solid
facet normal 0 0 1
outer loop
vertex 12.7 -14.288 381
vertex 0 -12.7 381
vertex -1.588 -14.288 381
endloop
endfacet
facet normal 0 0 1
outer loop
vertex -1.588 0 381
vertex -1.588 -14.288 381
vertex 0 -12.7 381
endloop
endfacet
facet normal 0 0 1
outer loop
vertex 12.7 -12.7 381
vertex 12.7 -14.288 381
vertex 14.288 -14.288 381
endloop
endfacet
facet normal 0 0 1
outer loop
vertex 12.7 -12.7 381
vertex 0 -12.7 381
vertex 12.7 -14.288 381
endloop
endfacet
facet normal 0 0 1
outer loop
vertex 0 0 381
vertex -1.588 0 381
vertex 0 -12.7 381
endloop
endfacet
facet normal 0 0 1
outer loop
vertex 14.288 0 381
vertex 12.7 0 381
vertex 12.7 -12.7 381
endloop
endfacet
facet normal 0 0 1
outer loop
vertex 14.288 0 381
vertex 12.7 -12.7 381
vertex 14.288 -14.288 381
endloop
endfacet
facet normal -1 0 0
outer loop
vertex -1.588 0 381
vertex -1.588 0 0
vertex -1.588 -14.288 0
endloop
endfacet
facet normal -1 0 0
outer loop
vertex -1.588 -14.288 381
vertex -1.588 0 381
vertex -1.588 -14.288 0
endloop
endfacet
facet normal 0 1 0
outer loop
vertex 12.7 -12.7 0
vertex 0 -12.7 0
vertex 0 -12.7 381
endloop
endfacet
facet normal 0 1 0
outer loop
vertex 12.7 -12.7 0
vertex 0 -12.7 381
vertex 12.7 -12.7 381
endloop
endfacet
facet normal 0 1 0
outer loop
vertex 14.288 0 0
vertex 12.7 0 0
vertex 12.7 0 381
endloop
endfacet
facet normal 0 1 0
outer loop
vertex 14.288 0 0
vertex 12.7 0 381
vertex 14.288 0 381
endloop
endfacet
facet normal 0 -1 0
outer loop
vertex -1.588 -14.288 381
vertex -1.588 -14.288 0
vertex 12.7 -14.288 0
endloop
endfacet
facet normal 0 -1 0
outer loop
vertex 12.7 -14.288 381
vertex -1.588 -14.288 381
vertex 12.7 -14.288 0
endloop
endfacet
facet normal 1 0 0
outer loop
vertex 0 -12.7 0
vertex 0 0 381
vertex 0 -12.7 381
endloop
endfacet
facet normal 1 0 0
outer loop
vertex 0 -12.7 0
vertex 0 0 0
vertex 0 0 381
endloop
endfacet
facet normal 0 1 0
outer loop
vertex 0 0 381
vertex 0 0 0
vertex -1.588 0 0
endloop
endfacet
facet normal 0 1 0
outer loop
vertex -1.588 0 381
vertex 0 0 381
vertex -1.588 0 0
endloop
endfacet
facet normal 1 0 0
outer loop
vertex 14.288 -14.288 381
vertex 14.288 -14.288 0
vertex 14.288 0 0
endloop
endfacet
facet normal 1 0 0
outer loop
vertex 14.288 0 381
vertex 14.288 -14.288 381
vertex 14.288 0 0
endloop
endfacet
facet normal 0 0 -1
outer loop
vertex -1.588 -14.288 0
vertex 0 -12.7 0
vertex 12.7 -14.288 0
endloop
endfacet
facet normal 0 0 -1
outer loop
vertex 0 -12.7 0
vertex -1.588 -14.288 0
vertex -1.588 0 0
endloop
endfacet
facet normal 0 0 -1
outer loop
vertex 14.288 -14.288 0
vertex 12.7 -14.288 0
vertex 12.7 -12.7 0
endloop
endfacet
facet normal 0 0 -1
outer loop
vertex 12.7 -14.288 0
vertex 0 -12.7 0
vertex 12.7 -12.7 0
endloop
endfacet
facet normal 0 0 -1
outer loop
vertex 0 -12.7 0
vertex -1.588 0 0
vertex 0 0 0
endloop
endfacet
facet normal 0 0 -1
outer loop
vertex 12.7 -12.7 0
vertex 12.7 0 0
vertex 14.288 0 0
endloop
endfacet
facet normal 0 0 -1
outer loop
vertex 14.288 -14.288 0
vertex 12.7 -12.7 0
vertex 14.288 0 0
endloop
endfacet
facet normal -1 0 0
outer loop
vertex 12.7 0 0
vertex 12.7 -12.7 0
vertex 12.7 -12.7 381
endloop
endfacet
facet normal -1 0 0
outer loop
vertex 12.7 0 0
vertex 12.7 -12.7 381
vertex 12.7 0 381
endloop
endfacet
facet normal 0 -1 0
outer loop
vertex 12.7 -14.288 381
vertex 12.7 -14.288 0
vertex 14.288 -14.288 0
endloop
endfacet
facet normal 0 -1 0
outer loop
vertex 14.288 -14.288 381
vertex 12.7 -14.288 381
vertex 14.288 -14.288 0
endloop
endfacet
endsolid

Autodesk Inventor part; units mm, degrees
ref_plane "YZ Plane" through (0, 0, 0) normal (1, 0, 0) x (0, 1, 0)
ref_plane "XZ Plane" through (0, 0, 0) normal (0, 1, 0) x (-1, 0, 0)
ref_plane "XY Plane" through (0, 0, 0) normal (0, 0, 1) x (1, 0, 0)
sketch "Sketch1" plane through (0, 0, 0) normal (0, 0, 1) x (1, 0, 0)
  line L0 (0, 0) -> (0, -12.7)
  line L1 (0, -12.7) -> (12.7, -12.7)
  line L2 (12.7, -12.7) -> (12.7, 0)
  line L3 (12.7, 0) -> (14.2875, 0)
  line L4 (12.7, -14.2875) -> (14.2875, -14.2875)
  line L5 (14.2875, -14.2875) -> (14.2875, 0)
  line L6 (0, 0) -> (-1.5875, 0)
  line L7 (-1.5875, 0) -> (-1.5875, -14.2875)
  line L8 (-1.5875, -14.2875) -> (12.7, -14.2875)
  dimension "d0" = 12.7
  dimension "d2" = 1.5875
  dimension "d3" = 1.5875
  dimension "d4" = 1.5875
extrude "Extrusion1" add sketch "Sketch1" along normal blind 381
properties part number "BackLiftProtoPart7"
